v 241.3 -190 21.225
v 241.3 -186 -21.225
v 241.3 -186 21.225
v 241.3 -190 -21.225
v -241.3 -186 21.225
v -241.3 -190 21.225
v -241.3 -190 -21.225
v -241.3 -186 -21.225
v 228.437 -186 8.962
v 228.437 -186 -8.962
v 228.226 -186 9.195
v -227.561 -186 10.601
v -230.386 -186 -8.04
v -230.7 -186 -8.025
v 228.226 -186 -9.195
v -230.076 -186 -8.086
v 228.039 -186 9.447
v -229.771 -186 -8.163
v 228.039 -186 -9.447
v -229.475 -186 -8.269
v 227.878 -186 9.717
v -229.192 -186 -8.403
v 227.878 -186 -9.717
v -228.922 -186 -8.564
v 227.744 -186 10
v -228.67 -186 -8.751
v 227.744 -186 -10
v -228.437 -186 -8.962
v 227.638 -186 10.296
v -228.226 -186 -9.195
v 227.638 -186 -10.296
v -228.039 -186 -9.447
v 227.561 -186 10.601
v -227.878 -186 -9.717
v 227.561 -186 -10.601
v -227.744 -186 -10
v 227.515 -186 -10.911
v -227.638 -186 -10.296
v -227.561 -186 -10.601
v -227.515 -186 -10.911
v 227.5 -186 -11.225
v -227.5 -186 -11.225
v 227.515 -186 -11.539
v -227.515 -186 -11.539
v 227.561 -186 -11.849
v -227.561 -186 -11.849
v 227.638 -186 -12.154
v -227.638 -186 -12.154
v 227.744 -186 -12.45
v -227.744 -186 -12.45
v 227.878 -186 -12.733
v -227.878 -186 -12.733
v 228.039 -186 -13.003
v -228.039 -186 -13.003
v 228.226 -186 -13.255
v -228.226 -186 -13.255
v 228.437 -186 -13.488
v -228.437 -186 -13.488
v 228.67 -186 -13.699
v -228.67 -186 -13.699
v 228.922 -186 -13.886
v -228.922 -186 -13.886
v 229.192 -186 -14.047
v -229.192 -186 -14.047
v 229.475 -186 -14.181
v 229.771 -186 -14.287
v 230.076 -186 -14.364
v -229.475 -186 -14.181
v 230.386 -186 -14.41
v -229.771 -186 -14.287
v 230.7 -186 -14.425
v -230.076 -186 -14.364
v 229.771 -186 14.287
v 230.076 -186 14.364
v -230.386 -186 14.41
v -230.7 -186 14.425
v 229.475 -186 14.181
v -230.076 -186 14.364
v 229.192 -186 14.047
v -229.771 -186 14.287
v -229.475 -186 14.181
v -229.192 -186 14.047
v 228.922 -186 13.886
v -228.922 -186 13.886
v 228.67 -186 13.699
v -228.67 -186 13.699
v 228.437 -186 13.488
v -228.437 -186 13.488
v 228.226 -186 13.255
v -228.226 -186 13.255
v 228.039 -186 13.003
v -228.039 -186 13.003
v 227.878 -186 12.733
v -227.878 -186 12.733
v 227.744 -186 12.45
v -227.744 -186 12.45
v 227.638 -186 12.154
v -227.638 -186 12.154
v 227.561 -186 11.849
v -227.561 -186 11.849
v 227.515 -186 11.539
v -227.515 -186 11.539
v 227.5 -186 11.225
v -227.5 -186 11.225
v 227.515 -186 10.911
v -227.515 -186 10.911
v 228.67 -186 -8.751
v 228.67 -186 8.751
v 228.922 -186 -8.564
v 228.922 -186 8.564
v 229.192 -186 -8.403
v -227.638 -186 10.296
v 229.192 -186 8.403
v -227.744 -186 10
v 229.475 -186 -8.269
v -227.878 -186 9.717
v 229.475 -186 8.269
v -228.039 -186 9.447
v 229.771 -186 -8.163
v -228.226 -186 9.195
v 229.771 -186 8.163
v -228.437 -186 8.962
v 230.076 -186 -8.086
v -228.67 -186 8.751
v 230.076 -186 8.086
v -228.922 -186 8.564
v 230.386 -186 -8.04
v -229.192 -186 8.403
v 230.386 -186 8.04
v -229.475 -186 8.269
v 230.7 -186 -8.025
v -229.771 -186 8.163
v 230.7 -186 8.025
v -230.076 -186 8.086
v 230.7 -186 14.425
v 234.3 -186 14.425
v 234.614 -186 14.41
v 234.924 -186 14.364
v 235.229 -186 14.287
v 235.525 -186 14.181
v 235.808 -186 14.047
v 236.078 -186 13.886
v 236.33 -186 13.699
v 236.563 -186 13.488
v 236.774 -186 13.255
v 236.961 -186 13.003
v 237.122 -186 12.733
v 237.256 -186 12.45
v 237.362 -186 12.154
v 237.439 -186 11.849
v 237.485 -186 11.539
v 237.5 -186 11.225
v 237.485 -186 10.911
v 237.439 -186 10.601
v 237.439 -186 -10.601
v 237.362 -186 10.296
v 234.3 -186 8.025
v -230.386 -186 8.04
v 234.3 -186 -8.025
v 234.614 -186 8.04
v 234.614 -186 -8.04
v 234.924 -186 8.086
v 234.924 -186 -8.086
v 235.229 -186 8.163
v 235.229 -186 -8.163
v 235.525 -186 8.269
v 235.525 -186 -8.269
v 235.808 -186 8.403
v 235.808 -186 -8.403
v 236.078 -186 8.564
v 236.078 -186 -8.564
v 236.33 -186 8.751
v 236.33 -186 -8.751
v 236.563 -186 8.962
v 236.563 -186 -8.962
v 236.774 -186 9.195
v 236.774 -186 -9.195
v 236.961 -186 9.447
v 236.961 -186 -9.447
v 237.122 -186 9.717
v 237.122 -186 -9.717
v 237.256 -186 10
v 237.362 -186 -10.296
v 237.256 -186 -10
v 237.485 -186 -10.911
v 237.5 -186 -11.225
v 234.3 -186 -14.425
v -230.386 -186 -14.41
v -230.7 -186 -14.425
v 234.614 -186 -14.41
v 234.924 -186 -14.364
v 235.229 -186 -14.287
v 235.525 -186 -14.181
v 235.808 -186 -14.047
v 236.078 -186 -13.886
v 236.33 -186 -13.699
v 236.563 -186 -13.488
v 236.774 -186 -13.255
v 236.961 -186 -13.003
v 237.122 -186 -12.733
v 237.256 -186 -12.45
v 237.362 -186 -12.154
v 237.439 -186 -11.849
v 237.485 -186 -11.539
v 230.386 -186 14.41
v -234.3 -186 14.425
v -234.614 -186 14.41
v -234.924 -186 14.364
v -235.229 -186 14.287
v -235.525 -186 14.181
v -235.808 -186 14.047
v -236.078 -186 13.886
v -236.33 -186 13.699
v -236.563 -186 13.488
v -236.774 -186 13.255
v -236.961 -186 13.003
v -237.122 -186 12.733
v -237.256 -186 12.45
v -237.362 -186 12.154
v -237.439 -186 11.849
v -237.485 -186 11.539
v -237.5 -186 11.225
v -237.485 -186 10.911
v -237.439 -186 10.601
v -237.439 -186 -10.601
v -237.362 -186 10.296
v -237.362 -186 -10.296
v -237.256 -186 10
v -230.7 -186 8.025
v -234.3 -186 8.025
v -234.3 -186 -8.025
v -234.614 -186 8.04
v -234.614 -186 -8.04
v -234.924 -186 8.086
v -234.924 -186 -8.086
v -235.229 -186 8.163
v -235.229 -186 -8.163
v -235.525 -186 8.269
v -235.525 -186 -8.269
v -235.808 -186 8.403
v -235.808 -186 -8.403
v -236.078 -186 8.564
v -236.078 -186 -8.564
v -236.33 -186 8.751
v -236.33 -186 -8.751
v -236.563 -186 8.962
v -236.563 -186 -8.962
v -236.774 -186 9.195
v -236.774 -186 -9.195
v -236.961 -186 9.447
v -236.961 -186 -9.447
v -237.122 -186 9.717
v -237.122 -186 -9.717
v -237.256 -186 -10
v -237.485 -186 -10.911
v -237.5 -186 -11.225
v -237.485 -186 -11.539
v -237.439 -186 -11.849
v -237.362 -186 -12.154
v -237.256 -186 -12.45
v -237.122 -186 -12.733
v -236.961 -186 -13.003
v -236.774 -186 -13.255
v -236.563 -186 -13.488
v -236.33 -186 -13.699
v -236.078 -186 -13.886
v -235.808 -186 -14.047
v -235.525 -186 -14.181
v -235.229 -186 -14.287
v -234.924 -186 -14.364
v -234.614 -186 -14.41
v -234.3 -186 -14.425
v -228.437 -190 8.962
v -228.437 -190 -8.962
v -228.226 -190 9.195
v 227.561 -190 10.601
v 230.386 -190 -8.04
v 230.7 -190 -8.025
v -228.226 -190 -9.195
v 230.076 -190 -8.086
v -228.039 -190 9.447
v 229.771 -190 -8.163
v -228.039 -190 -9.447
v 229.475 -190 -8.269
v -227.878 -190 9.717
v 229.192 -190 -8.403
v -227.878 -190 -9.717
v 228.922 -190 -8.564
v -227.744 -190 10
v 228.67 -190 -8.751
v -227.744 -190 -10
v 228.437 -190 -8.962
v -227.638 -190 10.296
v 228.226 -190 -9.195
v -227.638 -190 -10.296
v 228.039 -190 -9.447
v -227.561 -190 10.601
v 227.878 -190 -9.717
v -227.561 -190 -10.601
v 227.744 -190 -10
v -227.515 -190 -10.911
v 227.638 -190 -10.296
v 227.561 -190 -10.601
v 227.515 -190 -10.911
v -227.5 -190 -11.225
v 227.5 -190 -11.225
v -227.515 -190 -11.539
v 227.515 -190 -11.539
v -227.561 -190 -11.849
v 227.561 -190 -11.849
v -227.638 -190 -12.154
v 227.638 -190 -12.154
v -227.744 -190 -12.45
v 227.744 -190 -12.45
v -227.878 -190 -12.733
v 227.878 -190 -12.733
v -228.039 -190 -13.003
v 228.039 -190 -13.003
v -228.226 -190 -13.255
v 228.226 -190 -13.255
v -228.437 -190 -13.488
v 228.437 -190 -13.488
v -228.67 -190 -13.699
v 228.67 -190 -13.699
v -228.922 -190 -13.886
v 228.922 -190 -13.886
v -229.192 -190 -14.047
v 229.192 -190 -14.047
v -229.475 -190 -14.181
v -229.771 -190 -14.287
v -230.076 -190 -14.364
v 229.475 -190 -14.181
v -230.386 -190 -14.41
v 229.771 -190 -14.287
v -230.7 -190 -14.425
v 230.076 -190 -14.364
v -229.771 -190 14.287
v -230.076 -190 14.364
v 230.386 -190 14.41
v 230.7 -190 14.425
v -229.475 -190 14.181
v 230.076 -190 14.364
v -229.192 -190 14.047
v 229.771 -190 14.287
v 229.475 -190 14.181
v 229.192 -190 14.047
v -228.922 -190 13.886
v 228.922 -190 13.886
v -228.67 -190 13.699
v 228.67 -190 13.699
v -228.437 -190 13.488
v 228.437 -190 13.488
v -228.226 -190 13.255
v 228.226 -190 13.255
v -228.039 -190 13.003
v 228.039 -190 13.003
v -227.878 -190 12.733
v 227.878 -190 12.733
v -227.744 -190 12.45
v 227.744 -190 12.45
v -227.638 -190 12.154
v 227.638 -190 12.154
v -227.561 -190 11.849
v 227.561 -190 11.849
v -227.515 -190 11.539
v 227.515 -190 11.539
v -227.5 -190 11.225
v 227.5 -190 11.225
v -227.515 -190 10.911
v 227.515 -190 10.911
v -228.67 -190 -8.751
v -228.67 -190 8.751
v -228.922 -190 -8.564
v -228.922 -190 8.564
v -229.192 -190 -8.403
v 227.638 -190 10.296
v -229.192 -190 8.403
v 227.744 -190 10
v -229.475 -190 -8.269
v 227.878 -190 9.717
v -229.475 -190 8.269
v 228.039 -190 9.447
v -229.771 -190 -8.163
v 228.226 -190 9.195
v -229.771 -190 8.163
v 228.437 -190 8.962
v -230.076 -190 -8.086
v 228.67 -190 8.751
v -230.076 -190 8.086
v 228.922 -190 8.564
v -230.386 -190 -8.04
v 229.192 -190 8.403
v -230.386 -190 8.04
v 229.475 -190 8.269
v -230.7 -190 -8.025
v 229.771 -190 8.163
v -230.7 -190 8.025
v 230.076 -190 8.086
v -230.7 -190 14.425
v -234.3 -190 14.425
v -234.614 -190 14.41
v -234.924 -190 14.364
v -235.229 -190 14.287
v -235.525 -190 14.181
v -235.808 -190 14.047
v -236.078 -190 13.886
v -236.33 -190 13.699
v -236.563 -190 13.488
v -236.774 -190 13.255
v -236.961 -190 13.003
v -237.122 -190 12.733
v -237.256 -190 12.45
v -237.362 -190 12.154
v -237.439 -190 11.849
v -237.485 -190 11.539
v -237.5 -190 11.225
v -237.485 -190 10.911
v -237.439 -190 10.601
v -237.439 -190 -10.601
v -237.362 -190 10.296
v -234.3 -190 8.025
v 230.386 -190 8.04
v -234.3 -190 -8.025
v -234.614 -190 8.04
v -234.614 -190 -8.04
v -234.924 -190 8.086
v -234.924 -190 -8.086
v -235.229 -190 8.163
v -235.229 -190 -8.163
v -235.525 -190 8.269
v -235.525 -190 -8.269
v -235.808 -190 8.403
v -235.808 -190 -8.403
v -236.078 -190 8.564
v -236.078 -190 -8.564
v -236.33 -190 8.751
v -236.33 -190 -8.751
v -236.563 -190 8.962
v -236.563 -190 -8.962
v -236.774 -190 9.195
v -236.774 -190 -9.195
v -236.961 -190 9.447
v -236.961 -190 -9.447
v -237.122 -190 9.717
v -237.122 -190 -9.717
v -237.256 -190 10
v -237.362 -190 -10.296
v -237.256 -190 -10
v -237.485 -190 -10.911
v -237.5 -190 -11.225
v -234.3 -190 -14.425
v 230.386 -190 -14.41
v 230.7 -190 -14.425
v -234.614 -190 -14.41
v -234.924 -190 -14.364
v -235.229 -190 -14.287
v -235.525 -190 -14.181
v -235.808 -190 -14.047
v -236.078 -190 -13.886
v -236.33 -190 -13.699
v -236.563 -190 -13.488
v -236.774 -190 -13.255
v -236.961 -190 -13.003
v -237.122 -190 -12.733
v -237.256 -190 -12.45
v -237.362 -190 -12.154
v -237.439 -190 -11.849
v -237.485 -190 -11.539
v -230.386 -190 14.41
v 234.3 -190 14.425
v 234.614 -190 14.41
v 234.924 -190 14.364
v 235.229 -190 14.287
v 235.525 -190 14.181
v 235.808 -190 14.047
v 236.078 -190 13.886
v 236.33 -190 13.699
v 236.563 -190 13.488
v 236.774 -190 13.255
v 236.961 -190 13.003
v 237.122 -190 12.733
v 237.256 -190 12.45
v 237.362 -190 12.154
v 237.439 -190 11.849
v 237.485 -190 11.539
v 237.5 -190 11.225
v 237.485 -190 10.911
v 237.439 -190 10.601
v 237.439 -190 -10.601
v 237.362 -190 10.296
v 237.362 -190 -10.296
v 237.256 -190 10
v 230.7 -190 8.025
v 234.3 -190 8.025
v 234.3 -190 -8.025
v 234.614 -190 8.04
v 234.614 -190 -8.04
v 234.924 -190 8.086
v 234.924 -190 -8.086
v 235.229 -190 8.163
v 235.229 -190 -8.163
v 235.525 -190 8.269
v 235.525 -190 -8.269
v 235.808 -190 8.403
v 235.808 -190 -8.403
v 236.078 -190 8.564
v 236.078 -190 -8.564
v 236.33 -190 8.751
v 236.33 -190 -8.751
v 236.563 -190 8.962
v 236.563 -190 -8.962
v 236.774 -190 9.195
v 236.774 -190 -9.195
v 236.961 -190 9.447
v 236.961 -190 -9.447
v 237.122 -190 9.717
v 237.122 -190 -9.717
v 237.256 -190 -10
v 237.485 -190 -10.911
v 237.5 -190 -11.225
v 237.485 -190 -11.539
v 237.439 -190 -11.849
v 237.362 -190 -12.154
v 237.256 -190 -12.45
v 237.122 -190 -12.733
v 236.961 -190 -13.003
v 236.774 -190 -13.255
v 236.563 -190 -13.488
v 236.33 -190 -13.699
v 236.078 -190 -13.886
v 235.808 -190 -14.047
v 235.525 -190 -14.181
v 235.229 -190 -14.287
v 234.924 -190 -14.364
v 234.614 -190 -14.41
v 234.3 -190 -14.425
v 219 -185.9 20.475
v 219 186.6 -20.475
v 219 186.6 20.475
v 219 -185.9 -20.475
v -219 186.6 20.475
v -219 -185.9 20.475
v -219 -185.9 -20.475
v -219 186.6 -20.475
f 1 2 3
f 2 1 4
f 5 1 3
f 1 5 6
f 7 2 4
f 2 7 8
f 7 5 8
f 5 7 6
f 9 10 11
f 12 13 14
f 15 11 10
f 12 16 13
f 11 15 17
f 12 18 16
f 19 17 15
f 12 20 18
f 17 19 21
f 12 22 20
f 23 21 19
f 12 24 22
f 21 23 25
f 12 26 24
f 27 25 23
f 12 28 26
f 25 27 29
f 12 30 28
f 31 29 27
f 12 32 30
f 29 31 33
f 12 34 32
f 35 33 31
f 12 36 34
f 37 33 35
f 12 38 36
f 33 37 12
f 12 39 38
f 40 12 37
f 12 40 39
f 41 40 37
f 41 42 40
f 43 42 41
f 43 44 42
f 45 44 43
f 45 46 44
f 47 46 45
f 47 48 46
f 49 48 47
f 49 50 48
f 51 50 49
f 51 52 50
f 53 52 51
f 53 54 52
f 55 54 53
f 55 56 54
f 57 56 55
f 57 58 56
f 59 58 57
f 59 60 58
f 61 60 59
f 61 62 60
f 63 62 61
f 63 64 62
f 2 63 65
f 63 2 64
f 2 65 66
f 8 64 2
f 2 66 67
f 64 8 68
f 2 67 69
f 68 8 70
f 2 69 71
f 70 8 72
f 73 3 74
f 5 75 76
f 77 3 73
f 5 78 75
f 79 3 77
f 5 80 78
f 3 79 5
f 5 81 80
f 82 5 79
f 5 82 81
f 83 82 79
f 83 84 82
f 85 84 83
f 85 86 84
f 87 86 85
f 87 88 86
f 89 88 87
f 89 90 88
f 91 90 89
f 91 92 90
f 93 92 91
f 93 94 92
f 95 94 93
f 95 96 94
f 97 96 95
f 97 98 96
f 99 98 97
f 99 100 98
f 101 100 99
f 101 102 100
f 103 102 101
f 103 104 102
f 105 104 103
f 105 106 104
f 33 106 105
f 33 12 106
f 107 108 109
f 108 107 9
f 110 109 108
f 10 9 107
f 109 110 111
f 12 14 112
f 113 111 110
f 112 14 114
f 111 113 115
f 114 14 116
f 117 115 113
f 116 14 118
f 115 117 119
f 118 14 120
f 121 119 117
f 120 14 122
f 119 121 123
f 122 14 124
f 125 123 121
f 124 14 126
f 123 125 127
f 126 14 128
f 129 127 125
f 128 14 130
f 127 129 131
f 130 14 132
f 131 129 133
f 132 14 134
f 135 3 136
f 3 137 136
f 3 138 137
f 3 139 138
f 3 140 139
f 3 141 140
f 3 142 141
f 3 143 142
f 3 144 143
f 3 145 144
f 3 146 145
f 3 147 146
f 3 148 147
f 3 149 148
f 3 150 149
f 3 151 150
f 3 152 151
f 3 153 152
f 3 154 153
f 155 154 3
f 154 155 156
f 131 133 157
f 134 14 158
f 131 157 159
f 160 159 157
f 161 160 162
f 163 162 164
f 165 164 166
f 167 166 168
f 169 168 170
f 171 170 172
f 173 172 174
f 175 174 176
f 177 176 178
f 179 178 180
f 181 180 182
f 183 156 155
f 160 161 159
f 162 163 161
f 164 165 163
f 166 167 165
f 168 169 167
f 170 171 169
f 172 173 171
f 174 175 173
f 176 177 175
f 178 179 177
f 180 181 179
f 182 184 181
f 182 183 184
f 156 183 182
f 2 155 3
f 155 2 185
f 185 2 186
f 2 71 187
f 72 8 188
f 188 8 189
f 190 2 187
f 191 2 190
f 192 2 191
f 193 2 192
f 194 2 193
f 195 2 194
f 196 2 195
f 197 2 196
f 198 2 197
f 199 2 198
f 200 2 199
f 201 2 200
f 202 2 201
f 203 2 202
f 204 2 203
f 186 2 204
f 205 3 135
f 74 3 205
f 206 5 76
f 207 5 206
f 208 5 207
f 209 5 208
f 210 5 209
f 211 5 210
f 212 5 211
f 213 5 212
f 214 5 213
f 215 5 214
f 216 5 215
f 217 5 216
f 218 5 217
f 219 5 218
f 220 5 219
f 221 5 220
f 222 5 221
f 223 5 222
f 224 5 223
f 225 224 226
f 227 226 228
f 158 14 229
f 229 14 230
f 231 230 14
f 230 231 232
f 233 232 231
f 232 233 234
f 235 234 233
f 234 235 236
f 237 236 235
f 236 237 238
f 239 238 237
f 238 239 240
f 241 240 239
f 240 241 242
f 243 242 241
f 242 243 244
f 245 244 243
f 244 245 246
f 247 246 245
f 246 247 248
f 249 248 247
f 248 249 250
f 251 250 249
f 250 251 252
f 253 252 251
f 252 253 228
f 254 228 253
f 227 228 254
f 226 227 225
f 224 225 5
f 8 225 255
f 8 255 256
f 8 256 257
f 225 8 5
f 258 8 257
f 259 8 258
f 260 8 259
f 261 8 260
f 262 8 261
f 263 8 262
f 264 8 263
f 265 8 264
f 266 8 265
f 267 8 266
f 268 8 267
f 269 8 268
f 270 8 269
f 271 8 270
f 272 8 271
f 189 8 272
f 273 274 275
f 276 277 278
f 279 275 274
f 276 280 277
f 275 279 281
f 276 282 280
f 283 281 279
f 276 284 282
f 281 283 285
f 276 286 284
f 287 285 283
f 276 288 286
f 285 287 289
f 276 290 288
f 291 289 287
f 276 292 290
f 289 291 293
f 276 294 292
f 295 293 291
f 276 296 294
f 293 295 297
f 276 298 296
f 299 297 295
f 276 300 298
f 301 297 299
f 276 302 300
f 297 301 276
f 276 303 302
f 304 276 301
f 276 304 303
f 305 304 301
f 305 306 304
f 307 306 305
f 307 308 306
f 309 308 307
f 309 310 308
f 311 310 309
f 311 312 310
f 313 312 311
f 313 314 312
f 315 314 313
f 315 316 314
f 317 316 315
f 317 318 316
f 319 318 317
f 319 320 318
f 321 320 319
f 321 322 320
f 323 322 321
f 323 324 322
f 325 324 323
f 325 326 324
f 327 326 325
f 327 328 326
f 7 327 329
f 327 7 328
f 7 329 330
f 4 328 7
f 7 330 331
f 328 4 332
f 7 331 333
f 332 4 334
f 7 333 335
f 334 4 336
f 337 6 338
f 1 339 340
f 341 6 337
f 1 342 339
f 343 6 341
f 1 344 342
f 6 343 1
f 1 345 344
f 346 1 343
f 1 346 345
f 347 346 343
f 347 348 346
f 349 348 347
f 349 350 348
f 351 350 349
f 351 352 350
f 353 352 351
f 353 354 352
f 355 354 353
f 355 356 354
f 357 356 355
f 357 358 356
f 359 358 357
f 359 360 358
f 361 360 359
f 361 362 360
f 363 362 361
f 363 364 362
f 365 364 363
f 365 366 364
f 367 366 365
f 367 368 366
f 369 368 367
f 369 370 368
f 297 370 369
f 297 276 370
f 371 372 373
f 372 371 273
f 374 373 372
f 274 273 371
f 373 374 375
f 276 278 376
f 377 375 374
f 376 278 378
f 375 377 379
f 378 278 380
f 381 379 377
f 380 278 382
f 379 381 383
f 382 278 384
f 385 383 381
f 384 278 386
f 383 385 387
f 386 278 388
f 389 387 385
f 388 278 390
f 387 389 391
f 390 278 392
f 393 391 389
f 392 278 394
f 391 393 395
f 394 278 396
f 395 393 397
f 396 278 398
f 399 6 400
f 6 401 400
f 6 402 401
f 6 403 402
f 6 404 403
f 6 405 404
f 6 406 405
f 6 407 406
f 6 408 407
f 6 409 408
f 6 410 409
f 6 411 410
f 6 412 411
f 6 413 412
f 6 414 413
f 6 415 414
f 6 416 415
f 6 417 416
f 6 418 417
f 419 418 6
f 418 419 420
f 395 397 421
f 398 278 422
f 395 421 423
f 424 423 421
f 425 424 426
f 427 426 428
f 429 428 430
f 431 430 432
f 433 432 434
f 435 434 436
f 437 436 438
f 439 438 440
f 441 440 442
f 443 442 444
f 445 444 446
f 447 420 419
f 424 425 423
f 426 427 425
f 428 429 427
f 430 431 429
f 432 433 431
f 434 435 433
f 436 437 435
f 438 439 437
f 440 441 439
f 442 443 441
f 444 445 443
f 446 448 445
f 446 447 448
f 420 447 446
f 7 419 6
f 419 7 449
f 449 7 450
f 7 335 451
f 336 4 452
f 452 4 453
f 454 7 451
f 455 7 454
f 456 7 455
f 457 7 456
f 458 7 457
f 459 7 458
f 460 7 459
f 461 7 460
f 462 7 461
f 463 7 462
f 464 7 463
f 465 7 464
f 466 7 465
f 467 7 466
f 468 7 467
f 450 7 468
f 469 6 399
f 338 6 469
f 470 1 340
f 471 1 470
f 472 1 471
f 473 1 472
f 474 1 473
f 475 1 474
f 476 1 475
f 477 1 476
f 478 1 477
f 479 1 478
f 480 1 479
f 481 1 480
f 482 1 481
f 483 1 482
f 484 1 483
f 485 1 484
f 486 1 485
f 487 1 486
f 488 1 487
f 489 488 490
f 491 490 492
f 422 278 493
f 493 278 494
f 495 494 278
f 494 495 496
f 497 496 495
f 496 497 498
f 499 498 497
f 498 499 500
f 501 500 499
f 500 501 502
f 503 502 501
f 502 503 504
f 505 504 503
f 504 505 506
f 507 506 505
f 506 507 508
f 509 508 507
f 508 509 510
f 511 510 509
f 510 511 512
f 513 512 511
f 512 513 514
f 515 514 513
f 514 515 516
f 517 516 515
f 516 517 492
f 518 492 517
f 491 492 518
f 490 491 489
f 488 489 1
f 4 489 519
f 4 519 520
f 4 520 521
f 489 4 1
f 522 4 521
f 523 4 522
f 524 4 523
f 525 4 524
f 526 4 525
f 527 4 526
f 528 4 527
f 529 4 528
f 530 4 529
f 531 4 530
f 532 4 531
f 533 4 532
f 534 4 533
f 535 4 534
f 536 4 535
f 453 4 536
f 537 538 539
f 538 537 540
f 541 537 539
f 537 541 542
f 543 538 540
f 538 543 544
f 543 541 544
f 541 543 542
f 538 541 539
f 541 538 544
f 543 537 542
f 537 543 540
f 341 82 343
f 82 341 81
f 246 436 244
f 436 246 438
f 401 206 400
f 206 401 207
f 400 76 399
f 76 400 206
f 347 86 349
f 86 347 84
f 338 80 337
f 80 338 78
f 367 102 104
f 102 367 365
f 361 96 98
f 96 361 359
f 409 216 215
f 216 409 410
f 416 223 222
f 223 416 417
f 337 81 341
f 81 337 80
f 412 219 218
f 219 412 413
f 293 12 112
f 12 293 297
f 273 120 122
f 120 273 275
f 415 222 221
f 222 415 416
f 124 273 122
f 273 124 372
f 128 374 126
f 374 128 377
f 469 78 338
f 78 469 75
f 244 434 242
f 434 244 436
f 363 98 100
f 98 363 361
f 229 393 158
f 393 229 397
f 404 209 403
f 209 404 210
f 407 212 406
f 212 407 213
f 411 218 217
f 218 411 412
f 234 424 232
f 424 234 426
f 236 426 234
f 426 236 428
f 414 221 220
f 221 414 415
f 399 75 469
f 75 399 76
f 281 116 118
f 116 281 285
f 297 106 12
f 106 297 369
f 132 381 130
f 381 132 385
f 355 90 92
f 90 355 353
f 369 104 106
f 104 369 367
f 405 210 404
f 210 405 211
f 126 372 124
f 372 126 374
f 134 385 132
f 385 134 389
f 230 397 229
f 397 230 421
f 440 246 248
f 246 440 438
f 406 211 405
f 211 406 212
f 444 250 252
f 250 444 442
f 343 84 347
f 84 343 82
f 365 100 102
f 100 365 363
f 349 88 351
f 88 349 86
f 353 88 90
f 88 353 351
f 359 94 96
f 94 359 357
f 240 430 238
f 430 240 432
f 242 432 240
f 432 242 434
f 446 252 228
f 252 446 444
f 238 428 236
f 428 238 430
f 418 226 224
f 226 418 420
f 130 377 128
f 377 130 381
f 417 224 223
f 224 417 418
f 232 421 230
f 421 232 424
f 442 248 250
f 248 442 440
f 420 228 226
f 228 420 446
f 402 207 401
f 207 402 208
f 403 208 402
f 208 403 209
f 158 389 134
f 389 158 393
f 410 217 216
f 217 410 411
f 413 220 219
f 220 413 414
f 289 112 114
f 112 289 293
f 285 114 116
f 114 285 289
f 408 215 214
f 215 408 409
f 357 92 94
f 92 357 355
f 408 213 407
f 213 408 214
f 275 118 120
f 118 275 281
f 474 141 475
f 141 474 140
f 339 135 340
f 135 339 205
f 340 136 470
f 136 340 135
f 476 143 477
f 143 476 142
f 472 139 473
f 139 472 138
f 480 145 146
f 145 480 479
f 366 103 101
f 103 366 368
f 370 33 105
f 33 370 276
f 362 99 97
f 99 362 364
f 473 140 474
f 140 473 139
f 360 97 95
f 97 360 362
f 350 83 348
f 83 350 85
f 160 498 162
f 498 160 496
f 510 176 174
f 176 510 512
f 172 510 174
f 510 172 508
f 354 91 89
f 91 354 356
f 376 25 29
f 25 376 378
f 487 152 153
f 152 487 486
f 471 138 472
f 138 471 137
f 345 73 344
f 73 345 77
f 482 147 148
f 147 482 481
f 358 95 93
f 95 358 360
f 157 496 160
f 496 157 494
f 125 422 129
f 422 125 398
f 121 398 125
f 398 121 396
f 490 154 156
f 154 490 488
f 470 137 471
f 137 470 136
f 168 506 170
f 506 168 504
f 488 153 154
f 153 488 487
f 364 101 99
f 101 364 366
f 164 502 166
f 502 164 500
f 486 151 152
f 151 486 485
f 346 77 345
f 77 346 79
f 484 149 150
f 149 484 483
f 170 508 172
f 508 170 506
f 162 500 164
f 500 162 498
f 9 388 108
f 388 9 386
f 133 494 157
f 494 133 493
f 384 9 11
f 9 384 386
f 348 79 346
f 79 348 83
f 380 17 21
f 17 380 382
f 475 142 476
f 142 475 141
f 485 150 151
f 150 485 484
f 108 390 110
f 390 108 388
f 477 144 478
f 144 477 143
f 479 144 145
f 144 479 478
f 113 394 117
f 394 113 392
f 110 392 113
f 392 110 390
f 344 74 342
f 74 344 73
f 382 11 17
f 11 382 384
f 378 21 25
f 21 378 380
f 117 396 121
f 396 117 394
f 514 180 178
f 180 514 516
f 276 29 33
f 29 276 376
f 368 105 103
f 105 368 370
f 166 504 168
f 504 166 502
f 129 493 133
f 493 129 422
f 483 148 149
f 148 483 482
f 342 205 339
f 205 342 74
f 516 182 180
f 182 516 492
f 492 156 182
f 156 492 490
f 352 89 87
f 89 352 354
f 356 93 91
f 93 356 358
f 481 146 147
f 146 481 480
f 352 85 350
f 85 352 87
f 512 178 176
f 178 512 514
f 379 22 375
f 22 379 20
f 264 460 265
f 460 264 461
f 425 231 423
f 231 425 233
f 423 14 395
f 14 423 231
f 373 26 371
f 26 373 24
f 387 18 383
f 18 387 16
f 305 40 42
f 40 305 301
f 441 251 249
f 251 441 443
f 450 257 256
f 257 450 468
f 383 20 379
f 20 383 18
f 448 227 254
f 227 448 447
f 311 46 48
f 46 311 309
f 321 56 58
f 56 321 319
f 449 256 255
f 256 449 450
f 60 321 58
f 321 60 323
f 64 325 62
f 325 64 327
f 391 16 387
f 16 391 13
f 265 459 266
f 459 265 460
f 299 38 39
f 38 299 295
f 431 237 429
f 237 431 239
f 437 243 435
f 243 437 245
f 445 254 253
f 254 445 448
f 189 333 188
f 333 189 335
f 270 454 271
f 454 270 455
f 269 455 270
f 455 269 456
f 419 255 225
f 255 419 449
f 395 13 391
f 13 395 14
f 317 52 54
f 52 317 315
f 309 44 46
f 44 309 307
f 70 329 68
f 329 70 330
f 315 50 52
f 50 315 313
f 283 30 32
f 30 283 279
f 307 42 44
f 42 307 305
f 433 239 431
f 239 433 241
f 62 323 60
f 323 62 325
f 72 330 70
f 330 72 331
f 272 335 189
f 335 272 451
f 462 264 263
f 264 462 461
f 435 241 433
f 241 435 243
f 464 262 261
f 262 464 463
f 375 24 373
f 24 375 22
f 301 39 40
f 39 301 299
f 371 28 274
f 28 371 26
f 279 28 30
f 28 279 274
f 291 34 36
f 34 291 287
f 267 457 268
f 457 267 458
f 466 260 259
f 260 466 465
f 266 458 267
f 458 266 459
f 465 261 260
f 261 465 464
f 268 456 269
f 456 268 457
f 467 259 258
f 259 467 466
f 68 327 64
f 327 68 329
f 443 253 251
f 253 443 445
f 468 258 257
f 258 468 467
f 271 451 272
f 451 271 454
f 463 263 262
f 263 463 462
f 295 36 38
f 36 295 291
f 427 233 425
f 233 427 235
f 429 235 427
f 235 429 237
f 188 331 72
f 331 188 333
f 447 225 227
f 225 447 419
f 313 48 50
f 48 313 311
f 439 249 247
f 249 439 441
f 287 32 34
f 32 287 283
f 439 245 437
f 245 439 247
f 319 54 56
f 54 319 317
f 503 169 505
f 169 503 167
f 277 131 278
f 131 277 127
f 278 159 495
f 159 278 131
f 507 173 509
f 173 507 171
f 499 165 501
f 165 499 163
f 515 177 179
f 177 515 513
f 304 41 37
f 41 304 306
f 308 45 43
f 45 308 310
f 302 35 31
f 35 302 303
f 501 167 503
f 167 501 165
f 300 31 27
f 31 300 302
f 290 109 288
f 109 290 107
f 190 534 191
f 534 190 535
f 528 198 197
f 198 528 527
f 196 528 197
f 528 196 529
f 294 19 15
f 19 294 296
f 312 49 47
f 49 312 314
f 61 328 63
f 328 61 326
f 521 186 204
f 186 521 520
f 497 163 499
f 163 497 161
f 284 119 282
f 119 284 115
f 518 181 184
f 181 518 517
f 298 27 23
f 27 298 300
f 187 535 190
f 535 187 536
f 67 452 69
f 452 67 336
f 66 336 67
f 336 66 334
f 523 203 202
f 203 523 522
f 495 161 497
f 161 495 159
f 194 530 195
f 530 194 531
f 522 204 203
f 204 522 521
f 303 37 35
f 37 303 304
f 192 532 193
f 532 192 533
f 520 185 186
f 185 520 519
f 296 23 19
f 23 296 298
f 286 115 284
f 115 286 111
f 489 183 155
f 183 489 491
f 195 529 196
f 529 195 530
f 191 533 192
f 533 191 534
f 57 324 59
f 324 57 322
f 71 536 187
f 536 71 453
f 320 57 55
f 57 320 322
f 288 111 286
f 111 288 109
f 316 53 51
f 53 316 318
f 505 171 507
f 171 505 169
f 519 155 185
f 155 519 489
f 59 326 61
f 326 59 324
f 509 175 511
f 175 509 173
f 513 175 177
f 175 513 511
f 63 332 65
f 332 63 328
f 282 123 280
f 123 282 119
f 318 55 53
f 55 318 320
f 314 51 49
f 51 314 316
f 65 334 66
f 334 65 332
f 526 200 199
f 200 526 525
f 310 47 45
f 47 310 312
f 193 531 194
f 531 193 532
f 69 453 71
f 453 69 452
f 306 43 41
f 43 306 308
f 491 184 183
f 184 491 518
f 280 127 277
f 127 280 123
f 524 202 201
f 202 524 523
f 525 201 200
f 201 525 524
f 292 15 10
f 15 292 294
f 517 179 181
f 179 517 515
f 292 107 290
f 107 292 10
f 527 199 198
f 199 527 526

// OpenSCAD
// ============================================================================
// Atom Lithography Machine — Parametric OpenSCAD Module (S4.2-03)
// ============================================================================
// part_id           : S4.2-03
// parent_bom_id     : S4.2
// subsystem         : S4
// part_name         : Aktif sonumleme DSP denetleyici ve yuksek-hizli piezo amplifikatoru
// material          : Al 6061
// temp_stage        : 300 K (kabin)
// vacuum_grade      : Atmosfer
// tolerance         : ISO 2768-mK
// computed_mass_kg  : 5.12858
// envelope_mm       : 482.600 x 423.000 x 42.450
// design_maturity   : M0_M1_DETAILED_CAD_DESIGN_ONLY
// no_lab_measurement: true
// iec61508_certified: false
// semi_s2_certified : false
// Units: millimeters (mm)
// ============================================================================

$fn = 64;

// Nominal bounding envelope parameters (mm)
bbox_x = 482.6000;
bbox_y = 423.0000;
bbox_z = 42.4500;

// Part-specific parametric dimensions
rack_u_height = 1;
depth_mm = 380.0;
loop_khz = 10.0;

// Interface / port parameters (mm)

module part_S4_2_03() {
  difference() {
    union() {
      // 19-inch EIA-310 1U front bezel (facing -Y)
      translate([0.000, -188.000, 0.000]) cube([482.600, 4.000, 42.450], center=true);
      // Hollow EMI rack body
      translate([0.000, 0.350, 0.000]) cube([438.000, 372.500, 40.950], center=true);
    }
    // EIA-310 upper-left ear slot
    translate([-232.500, -188.000, 11.225]) rotate([90.000, 0.000, 0.000]) {
      hull() {
        translate([-1.800, 0, 0]) cylinder(d=6.400, h=8.000, center=true);
        translate([1.800, 0, 0]) cylinder(d=6.400, h=8.000, center=true);
      }
    }
    // EIA-310 upper-right ear slot
    translate([232.500, -188.000, 11.225]) rotate([90.000, 0.000, 0.000]) {
      hull() {
        translate([-1.800, 0, 0]) cylinder(d=6.400, h=8.000, center=true);
        translate([1.800, 0, 0]) cylinder(d=6.400, h=8.000, center=true);
      }
    }
    // EIA-310 lower-left ear slot
    translate([-232.500, -188.000, -11.225]) rotate([90.000, 0.000, 0.000]) {
      hull() {
        translate([-1.800, 0, 0]) cylinder(d=6.400, h=8.000, center=true);
        translate([1.800, 0, 0]) cylinder(d=6.400, h=8.000, center=true);
      }
    }
    // EIA-310 lower-right ear slot
    translate([232.500, -188.000, -11.225]) rotate([90.000, 0.000, 0.000]) {
      hull() {
        translate([-1.800, 0, 0]) cylinder(d=6.400, h=8.000, center=true);
        translate([1.800, 0, 0]) cylinder(d=6.400, h=8.000, center=true);
      }
    }
  }
}

// World assembly mounting transform (global machine frame, mm / deg):
// translate([1480.000, -220.000, 190.075]) rotate([0.000, 0.000, 0.000]) part_S4_2_03();

part_S4_2_03();
